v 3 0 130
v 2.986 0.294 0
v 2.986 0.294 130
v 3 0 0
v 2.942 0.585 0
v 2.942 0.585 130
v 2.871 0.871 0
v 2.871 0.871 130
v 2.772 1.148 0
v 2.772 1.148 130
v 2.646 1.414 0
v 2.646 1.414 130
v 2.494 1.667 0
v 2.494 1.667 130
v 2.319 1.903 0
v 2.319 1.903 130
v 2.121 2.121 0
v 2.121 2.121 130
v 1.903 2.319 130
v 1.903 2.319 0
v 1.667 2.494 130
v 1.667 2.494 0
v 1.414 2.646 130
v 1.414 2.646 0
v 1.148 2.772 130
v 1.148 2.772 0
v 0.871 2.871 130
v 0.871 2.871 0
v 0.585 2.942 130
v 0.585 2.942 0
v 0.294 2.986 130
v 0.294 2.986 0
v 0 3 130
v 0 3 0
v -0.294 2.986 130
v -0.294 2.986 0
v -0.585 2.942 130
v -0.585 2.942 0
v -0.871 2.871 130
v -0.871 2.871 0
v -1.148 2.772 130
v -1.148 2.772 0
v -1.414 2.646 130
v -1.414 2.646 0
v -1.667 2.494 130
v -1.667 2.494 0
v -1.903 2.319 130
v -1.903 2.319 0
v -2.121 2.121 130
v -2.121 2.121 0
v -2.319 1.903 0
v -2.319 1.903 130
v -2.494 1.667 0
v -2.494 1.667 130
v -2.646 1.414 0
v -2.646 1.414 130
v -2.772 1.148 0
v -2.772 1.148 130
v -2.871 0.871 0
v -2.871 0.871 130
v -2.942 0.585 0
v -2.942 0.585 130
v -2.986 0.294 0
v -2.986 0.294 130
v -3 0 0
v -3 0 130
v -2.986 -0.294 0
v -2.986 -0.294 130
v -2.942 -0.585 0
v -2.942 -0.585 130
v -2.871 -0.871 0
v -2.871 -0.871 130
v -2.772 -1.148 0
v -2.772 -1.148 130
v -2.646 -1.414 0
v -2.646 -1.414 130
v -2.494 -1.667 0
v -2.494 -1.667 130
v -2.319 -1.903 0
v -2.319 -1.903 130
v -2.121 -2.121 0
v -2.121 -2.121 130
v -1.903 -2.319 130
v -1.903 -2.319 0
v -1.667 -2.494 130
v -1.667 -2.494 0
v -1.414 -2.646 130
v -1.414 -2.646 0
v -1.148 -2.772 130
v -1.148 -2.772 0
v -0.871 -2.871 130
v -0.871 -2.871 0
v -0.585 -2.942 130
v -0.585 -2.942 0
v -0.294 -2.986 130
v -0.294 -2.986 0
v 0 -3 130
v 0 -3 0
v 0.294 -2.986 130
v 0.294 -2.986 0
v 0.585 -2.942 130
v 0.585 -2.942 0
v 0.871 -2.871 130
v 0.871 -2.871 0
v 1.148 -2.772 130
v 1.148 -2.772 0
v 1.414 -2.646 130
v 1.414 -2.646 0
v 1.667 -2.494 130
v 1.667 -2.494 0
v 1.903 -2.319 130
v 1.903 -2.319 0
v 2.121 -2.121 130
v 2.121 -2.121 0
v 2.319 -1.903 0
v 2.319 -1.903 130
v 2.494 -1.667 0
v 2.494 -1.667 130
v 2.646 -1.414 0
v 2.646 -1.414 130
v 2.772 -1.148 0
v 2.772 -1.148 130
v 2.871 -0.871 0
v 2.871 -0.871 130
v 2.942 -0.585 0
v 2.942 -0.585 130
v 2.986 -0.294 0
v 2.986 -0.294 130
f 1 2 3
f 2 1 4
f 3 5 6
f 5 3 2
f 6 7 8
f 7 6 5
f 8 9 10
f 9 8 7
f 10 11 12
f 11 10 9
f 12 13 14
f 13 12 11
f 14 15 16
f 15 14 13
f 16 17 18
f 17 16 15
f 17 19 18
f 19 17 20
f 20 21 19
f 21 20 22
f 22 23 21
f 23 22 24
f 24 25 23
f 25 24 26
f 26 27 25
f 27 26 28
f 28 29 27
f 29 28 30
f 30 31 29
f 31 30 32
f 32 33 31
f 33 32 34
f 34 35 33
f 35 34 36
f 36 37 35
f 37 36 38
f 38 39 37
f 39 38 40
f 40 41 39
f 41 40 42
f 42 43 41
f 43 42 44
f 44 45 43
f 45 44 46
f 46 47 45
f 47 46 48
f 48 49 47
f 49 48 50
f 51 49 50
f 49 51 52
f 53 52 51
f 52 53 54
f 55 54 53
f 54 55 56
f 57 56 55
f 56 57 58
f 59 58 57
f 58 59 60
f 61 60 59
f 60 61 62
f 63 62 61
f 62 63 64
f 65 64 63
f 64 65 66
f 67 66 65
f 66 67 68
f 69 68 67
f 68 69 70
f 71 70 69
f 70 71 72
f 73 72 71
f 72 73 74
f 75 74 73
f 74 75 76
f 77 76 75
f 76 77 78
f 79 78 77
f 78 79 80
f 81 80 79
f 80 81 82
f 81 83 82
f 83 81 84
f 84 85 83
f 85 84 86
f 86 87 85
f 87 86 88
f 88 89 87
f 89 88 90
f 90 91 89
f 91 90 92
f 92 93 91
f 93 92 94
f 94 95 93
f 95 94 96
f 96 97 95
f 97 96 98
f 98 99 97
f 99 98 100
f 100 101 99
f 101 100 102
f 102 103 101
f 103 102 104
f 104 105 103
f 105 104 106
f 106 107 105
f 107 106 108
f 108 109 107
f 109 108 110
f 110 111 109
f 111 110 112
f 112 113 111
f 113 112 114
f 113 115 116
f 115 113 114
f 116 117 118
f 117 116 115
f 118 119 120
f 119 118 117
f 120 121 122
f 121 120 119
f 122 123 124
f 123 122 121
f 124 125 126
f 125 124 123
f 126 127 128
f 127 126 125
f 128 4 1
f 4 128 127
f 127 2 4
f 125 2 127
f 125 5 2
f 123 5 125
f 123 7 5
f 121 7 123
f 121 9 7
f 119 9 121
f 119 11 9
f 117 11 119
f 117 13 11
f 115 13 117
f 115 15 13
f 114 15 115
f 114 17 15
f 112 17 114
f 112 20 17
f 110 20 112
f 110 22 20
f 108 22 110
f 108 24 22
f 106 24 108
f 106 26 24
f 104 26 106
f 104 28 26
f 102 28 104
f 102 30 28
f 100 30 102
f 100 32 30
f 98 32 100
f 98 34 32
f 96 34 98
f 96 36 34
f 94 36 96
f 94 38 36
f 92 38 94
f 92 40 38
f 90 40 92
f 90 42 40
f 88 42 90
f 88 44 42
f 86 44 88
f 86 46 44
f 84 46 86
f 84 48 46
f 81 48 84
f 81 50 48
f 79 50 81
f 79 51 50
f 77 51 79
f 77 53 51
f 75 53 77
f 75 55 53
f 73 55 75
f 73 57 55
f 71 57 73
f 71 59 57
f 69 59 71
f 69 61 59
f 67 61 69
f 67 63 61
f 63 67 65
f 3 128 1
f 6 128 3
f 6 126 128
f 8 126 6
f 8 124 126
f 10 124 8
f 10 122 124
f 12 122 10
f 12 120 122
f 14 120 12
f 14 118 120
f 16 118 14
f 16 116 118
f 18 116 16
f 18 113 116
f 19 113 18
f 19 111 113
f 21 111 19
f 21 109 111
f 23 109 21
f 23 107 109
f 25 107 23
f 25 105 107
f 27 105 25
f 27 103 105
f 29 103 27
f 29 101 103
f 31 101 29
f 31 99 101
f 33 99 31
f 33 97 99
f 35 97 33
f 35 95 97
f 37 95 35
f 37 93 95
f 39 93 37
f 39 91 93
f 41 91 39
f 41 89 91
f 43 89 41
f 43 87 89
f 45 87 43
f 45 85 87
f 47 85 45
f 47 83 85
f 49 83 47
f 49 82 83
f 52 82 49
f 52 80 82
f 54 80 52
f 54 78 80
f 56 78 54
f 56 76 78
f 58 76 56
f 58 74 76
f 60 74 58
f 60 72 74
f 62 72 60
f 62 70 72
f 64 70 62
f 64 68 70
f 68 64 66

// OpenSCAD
// file: extender_params.scad
// FIXME: Needs to be calibrated as explained in
// https://github.com/revarbat/BOSL2/wiki/constants.scad#constant-slop
slop = 0.10;

L = 130;

od = 40;

// Pin
pid = 6; // internal diameter
ped = pid + 4*slop;  // external diameter
pfn = $preview ? 32 : 64;  // $fn

d = 30;
l1 = 6;
l2 = 6;
pitch = 1.5;

// https://en.wikibooks.org/wiki/OpenSCAD_User_Manual/Other_Language_Features#$fa,_$fs_and_$fn

fn = $preview ? 64 : 128;
// main file
include <extender_params.scad>

color("red")
cylinder(h = L, r=pid/2, center=false, $fn = pfn);
